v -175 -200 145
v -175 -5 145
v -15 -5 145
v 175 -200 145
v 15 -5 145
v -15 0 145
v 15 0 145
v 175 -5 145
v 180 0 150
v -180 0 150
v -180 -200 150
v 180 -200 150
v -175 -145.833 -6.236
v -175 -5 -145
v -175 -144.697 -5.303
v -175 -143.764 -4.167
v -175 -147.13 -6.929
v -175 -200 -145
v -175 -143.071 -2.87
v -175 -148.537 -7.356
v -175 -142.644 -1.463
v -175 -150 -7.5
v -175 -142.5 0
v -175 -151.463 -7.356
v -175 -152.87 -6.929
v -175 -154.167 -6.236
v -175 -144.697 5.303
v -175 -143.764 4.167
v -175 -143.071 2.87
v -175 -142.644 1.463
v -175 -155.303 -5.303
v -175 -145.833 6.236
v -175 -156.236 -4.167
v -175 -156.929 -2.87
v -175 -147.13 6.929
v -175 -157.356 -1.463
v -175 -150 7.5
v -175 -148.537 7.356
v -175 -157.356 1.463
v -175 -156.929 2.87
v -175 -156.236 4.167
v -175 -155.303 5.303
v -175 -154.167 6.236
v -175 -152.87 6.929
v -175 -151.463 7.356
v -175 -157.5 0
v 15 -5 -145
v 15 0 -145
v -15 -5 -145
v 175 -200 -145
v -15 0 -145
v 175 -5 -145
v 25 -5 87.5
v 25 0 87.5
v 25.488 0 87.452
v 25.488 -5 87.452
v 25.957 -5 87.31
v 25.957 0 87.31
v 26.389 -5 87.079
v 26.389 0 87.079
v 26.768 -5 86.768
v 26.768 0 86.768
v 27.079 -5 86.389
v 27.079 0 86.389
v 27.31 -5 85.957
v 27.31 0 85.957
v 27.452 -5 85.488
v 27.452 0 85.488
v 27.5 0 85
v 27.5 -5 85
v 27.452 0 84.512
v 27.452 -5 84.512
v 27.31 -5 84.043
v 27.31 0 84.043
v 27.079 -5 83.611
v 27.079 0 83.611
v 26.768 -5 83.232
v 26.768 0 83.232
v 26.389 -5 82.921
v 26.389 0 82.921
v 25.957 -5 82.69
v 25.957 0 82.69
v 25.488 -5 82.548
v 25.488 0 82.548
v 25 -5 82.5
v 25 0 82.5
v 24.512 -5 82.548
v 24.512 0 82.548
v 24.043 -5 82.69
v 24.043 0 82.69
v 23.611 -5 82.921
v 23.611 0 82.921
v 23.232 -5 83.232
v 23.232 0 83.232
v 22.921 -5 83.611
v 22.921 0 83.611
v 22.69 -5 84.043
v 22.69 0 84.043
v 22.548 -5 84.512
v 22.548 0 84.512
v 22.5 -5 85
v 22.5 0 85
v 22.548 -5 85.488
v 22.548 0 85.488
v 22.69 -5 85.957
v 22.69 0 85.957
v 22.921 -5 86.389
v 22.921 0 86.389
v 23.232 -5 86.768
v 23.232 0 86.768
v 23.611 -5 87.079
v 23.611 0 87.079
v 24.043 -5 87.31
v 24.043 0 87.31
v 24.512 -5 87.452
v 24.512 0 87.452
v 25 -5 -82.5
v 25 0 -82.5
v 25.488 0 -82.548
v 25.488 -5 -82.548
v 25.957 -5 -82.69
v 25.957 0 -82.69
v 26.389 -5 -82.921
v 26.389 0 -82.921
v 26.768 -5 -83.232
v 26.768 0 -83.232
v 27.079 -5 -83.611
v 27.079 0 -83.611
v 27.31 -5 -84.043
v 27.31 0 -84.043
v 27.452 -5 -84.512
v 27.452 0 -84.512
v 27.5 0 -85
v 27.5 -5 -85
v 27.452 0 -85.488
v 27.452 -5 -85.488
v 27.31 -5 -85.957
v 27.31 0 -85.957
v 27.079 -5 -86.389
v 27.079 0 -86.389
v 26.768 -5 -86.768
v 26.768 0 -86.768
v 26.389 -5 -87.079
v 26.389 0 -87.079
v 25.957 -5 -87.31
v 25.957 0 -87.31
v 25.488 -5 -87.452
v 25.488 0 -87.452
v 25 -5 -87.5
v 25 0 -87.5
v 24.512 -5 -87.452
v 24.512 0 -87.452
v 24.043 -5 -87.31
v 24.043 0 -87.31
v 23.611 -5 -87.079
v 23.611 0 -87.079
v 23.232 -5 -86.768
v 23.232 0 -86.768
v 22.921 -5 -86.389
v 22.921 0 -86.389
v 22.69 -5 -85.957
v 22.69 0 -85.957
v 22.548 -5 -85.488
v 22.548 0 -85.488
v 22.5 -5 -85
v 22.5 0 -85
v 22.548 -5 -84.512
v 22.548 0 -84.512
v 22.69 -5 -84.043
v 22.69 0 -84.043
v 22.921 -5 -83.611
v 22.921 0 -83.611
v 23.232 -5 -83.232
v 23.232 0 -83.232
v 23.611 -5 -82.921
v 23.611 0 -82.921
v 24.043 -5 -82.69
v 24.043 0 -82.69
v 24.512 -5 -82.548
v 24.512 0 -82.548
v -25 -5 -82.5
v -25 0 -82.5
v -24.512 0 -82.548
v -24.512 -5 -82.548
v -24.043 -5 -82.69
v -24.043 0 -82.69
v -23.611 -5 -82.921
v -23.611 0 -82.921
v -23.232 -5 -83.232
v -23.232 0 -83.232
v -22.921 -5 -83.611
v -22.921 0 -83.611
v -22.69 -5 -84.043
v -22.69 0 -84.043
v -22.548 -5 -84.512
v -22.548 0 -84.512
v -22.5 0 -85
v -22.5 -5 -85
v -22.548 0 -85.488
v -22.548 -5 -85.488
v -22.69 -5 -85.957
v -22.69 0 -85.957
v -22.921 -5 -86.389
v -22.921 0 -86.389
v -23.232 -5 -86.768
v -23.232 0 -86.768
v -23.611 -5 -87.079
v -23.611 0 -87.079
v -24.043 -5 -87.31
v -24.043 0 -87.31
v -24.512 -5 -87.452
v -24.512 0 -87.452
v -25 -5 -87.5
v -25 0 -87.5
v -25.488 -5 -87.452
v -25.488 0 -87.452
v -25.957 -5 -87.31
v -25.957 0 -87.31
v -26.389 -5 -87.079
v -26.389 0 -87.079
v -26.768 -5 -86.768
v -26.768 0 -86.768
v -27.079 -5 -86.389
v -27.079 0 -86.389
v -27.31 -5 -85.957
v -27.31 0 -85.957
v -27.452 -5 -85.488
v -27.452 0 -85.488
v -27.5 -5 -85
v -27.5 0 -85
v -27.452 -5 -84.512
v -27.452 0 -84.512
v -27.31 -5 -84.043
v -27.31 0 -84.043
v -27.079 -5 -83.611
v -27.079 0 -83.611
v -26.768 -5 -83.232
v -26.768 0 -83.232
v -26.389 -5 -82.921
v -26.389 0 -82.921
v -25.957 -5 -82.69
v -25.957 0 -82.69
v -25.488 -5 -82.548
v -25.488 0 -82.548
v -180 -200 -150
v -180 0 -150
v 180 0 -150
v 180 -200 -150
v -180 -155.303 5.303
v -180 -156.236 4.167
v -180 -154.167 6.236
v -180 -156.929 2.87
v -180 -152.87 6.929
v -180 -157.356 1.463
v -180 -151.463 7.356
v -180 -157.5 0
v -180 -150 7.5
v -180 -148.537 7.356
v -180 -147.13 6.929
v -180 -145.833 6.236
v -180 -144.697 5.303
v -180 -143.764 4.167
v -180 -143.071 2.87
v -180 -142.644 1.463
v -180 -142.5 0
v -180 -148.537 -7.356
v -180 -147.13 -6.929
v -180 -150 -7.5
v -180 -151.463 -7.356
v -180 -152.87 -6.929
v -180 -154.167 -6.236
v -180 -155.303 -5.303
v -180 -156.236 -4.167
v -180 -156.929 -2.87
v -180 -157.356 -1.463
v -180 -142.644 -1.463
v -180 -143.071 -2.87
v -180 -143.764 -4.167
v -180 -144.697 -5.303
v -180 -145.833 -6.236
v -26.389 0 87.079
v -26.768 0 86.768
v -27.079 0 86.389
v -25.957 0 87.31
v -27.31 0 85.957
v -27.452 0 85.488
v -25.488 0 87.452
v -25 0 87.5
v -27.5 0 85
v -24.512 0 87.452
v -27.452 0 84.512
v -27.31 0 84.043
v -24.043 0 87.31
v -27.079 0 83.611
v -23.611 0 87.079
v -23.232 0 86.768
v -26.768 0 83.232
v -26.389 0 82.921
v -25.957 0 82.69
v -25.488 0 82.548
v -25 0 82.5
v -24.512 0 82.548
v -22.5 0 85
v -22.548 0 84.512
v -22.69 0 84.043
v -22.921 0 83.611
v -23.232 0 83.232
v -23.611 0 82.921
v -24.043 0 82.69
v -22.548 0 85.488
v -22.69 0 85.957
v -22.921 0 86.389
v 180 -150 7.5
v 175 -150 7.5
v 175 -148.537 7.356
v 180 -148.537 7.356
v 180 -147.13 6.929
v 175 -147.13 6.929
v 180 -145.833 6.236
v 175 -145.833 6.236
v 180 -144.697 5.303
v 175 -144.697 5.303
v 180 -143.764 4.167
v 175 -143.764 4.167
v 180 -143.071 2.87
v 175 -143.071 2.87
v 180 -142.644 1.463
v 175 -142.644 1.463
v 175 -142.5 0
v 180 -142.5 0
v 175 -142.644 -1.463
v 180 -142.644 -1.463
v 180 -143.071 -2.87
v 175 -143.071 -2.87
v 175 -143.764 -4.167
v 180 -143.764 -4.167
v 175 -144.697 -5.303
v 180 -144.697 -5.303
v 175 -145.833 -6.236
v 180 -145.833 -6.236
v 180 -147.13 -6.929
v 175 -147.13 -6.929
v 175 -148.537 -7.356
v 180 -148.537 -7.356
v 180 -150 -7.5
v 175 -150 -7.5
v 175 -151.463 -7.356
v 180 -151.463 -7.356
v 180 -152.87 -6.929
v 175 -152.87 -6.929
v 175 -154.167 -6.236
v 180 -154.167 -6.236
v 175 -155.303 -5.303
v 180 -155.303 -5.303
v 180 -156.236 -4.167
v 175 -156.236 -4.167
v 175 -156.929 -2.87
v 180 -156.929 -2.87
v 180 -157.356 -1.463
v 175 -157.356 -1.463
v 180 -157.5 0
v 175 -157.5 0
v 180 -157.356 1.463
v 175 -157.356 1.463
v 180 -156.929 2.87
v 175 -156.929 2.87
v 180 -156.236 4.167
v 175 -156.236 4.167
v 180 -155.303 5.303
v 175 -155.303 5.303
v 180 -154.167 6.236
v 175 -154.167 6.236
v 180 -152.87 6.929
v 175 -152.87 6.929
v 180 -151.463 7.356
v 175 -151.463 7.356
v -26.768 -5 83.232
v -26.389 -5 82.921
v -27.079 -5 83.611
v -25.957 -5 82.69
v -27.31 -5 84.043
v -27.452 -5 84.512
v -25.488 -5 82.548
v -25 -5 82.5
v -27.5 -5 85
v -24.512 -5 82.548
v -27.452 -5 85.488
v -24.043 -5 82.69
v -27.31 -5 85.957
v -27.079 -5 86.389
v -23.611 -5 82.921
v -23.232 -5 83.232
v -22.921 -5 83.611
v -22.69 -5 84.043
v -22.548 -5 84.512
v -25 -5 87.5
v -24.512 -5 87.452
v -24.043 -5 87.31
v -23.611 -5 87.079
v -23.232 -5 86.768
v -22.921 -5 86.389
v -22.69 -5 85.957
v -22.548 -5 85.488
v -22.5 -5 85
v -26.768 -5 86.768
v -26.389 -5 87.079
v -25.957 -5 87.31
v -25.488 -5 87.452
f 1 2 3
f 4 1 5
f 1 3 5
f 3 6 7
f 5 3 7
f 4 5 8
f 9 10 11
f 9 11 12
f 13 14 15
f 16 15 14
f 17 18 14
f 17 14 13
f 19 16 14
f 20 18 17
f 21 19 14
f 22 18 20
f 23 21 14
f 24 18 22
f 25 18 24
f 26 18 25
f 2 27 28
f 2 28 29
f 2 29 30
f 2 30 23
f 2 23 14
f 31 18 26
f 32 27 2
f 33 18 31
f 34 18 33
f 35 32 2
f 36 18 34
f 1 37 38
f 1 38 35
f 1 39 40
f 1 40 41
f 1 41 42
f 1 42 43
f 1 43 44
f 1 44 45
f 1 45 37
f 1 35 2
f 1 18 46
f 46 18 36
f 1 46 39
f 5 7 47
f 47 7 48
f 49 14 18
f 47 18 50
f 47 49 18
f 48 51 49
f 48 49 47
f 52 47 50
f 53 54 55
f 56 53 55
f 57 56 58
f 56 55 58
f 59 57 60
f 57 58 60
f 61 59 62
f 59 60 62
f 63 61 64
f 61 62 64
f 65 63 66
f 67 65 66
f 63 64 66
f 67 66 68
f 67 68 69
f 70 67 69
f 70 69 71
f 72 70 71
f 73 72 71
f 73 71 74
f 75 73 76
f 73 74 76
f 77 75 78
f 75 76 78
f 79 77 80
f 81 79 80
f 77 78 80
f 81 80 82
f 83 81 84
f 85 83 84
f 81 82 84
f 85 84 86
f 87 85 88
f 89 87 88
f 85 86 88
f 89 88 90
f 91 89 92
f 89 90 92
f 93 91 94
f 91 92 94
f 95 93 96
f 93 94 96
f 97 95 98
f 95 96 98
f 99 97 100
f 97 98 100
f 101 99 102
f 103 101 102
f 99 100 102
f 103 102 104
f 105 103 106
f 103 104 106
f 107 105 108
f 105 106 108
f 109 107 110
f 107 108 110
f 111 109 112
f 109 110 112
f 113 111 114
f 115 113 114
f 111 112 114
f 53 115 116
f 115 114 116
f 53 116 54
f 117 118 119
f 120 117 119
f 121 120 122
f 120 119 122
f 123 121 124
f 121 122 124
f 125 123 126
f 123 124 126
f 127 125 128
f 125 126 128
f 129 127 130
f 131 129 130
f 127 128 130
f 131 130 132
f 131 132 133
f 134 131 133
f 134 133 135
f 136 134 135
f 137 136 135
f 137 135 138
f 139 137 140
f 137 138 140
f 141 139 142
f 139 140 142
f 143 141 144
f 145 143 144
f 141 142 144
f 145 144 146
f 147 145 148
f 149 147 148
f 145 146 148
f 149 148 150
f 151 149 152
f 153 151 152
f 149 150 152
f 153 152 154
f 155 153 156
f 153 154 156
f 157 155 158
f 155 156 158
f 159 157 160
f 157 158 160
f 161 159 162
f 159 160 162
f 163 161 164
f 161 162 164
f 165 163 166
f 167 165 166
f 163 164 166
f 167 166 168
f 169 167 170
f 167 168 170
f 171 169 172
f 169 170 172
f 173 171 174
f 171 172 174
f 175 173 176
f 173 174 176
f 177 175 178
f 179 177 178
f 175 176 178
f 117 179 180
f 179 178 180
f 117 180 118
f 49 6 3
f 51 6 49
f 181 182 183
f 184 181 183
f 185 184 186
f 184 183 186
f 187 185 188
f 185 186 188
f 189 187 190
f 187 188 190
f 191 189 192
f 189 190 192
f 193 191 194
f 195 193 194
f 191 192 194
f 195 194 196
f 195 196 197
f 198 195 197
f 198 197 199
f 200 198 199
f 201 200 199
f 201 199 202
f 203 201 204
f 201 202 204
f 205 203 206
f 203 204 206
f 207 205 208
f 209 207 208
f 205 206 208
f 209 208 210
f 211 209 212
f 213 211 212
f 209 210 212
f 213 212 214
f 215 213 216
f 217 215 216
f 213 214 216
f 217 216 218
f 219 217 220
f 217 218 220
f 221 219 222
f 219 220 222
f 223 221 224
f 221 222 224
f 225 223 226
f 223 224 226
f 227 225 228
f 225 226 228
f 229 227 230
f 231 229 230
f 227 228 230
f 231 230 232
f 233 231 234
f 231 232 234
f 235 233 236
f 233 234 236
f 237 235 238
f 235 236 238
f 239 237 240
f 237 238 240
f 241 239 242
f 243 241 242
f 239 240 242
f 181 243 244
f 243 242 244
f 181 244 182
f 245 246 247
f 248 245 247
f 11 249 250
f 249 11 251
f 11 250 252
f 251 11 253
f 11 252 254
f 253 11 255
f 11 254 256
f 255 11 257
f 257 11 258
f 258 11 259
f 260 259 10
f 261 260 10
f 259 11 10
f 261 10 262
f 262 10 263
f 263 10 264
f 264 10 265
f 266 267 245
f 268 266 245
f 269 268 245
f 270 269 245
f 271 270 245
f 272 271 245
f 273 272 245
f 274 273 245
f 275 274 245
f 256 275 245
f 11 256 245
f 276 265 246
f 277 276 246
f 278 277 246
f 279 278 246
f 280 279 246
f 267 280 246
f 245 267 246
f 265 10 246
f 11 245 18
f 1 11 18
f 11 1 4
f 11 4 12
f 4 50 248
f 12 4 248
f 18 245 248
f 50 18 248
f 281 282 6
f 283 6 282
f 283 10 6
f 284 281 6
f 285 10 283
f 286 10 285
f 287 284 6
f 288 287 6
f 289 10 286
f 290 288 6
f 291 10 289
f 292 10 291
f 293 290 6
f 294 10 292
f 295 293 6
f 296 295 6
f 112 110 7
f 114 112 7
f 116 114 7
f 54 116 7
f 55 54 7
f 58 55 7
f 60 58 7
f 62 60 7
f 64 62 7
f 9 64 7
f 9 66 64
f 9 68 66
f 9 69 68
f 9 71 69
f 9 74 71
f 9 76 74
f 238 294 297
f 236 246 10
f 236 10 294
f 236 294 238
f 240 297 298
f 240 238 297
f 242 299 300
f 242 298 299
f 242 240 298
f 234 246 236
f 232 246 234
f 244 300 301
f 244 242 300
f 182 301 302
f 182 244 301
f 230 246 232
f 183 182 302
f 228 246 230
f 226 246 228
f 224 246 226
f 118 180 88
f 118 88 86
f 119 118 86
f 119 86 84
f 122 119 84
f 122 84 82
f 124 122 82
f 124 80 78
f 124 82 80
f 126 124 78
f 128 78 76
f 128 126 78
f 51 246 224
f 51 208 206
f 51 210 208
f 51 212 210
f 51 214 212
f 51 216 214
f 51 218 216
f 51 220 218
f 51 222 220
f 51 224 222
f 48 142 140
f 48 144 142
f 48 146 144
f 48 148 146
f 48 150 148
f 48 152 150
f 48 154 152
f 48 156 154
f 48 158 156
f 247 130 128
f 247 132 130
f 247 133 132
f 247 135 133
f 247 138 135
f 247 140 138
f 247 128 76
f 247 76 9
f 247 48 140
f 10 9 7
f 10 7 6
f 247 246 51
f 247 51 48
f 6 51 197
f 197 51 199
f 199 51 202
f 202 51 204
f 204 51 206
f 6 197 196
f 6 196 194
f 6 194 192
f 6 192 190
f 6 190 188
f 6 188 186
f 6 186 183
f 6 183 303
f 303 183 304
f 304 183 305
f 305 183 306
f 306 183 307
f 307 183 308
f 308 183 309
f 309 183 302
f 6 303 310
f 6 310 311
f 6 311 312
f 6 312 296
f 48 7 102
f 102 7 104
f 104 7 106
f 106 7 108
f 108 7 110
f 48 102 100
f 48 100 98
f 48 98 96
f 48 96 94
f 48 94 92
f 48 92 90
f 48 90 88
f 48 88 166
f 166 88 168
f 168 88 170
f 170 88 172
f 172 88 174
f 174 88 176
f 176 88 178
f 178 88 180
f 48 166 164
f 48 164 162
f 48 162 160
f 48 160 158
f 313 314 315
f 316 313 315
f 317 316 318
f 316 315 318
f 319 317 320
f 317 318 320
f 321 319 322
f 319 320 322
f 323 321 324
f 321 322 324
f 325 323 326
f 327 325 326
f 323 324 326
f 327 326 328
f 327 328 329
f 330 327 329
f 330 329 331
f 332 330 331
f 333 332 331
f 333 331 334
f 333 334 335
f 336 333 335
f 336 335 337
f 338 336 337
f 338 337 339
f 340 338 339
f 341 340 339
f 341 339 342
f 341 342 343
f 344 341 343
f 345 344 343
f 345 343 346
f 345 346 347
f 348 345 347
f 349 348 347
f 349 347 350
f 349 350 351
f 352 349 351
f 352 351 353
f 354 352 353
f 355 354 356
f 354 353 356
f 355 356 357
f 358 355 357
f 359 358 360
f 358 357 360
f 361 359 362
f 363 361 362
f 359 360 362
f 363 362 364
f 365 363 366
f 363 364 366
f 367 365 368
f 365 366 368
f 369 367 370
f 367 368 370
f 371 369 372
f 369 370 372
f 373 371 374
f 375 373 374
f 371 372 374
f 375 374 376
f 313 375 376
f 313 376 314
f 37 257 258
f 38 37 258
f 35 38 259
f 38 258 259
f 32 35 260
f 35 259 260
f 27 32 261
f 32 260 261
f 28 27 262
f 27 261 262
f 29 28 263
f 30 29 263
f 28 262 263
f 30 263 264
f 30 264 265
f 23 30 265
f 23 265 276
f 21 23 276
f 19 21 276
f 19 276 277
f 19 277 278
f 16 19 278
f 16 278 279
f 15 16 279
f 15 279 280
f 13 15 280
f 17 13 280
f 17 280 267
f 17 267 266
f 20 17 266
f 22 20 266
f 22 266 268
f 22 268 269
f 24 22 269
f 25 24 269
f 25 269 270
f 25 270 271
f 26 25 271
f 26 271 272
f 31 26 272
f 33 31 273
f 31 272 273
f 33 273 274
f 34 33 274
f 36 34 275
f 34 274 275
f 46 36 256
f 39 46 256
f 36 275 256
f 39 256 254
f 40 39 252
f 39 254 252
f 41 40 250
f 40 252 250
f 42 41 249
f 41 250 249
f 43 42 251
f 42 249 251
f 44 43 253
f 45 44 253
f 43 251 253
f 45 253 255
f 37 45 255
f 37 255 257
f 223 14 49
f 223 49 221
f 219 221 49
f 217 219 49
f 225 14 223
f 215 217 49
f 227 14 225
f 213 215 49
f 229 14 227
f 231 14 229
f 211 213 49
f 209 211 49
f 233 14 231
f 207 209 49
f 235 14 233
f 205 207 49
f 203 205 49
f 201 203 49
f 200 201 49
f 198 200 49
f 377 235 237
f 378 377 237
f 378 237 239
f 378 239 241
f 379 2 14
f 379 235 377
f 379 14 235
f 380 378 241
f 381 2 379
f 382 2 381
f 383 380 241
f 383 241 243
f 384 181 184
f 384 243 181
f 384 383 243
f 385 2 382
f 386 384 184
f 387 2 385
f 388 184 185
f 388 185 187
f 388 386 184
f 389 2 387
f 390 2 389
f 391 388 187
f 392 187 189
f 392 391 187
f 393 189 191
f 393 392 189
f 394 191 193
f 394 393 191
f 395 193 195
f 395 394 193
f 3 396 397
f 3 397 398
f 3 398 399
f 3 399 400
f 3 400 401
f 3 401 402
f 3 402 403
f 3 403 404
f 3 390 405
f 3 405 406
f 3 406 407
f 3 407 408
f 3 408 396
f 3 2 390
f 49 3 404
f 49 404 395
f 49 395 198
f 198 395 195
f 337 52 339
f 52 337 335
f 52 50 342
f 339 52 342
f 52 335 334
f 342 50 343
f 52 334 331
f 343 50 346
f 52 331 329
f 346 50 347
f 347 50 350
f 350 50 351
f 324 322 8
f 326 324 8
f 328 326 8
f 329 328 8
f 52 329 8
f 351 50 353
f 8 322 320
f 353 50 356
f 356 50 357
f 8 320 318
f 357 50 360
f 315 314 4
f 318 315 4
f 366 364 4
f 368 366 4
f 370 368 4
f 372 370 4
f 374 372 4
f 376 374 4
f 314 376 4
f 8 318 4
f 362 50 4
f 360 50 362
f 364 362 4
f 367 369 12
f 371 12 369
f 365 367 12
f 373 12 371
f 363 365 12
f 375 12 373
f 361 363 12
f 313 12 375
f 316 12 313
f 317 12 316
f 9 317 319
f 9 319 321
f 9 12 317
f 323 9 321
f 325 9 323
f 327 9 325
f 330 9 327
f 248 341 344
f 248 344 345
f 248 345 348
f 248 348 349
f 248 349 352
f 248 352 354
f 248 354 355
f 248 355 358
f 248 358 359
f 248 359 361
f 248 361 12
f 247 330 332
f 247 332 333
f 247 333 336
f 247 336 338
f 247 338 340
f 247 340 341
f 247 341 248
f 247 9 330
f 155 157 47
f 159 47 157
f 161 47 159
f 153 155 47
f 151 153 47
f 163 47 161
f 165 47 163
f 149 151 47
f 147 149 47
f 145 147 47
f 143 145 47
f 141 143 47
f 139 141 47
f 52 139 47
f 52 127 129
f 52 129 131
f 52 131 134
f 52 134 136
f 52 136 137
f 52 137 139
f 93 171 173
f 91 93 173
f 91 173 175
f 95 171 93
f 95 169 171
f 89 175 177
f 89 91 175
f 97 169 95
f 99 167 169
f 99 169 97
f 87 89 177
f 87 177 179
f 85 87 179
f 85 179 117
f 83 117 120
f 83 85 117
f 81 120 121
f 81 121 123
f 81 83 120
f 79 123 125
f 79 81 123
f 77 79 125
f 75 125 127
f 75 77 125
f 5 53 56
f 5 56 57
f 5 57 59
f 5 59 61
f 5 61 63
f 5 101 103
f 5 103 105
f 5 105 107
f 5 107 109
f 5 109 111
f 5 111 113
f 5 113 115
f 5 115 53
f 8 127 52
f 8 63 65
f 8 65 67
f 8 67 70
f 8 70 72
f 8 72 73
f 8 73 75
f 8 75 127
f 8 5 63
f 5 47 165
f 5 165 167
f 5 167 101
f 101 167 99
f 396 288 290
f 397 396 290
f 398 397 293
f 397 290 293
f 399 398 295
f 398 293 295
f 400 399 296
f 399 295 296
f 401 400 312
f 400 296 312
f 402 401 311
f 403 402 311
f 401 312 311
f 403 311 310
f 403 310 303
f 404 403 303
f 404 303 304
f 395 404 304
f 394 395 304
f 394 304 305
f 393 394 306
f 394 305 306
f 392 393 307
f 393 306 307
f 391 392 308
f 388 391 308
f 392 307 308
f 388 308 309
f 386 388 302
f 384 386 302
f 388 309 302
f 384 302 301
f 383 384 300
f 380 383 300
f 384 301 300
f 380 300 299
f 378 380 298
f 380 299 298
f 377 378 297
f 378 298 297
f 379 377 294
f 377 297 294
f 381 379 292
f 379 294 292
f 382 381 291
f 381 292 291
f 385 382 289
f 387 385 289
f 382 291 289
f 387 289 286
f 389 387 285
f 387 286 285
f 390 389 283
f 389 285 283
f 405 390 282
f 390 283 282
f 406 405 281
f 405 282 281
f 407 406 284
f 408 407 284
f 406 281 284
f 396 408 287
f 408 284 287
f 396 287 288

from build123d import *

# Parameters (mm, degrees)
SKETCH1_W           = 360
SKETCH1_H           = 300
BOSS_EXTRUDE1_DEPTH = 200
SKETCH2_W           = 350
SKETCH2_H           = 290
CUT_EXTRUDE1_DEPTH  = 195
SKETCH3_W           = 30
SKETCH3_H           = 290
CUT_EXTRUDE2_DEPTH  = 309.058436015
SKETCH4_R           = 7.5
CUT_EXTRUDE3_DEPTH  = 439.292140016
SKETCH5_R           = 2.5
CUT_EXTRUDE4_DEPTH  = 5


with BuildPart() as part:
    # Sketch1 → Boss-Extrude1 (new body)
    with BuildSketch(Plane(origin=(0, 0, 0), x_dir=(1, 0, 0), z_dir=(0, 1, 0))):
        Rectangle(SKETCH1_W, SKETCH1_H)
    extrude(amount=-BOSS_EXTRUDE1_DEPTH)

    # Sketch2 → Cut-Extrude1 (cut)
    with BuildSketch(Plane.XZ.offset(200)):
        Rectangle(SKETCH2_W, SKETCH2_H)
    extrude(amount=-CUT_EXTRUDE1_DEPTH, mode=Mode.SUBTRACT)

    # Sketch3 → Cut-Extrude2 (cut, through all)
    with BuildSketch(Plane(origin=(0, 0, 0), x_dir=(1, 0, 0), z_dir=(0, 1, 0))):
        Rectangle(SKETCH3_W, SKETCH3_H)
    extrude(amount=-CUT_EXTRUDE2_DEPTH, mode=Mode.SUBTRACT)

    # Sketch4 → Cut-Extrude3 (cut, through all)
    with BuildSketch(Plane.ZY.offset(180)):
        with Locations((0, -150)):
            Circle(SKETCH4_R)
    extrude(amount=-CUT_EXTRUDE3_DEPTH, mode=Mode.SUBTRACT)

    # Sketch5 → Cut-Extrude4 (cut)
    with BuildSketch(Plane(origin=(0, 0, 0), x_dir=(1, 0, 0), z_dir=(0, 1, 0))):
        with Locations(Location((-25, 85, 0), (0, 0, 270))):
            Circle(SKETCH5_R)
        with Locations(Location((25, 85, 0), (0, 0, 270))):
            Circle(SKETCH5_R)
        with Locations(Location((25, -85, 0), (0, 0, 270))):
            Circle(SKETCH5_R)
        with Locations(Location((-25, -85, 0), (0, 0, 270))):
            Circle(SKETCH5_R)
    extrude(amount=-CUT_EXTRUDE4_DEPTH, mode=Mode.SUBTRACT)


solid = part.part
